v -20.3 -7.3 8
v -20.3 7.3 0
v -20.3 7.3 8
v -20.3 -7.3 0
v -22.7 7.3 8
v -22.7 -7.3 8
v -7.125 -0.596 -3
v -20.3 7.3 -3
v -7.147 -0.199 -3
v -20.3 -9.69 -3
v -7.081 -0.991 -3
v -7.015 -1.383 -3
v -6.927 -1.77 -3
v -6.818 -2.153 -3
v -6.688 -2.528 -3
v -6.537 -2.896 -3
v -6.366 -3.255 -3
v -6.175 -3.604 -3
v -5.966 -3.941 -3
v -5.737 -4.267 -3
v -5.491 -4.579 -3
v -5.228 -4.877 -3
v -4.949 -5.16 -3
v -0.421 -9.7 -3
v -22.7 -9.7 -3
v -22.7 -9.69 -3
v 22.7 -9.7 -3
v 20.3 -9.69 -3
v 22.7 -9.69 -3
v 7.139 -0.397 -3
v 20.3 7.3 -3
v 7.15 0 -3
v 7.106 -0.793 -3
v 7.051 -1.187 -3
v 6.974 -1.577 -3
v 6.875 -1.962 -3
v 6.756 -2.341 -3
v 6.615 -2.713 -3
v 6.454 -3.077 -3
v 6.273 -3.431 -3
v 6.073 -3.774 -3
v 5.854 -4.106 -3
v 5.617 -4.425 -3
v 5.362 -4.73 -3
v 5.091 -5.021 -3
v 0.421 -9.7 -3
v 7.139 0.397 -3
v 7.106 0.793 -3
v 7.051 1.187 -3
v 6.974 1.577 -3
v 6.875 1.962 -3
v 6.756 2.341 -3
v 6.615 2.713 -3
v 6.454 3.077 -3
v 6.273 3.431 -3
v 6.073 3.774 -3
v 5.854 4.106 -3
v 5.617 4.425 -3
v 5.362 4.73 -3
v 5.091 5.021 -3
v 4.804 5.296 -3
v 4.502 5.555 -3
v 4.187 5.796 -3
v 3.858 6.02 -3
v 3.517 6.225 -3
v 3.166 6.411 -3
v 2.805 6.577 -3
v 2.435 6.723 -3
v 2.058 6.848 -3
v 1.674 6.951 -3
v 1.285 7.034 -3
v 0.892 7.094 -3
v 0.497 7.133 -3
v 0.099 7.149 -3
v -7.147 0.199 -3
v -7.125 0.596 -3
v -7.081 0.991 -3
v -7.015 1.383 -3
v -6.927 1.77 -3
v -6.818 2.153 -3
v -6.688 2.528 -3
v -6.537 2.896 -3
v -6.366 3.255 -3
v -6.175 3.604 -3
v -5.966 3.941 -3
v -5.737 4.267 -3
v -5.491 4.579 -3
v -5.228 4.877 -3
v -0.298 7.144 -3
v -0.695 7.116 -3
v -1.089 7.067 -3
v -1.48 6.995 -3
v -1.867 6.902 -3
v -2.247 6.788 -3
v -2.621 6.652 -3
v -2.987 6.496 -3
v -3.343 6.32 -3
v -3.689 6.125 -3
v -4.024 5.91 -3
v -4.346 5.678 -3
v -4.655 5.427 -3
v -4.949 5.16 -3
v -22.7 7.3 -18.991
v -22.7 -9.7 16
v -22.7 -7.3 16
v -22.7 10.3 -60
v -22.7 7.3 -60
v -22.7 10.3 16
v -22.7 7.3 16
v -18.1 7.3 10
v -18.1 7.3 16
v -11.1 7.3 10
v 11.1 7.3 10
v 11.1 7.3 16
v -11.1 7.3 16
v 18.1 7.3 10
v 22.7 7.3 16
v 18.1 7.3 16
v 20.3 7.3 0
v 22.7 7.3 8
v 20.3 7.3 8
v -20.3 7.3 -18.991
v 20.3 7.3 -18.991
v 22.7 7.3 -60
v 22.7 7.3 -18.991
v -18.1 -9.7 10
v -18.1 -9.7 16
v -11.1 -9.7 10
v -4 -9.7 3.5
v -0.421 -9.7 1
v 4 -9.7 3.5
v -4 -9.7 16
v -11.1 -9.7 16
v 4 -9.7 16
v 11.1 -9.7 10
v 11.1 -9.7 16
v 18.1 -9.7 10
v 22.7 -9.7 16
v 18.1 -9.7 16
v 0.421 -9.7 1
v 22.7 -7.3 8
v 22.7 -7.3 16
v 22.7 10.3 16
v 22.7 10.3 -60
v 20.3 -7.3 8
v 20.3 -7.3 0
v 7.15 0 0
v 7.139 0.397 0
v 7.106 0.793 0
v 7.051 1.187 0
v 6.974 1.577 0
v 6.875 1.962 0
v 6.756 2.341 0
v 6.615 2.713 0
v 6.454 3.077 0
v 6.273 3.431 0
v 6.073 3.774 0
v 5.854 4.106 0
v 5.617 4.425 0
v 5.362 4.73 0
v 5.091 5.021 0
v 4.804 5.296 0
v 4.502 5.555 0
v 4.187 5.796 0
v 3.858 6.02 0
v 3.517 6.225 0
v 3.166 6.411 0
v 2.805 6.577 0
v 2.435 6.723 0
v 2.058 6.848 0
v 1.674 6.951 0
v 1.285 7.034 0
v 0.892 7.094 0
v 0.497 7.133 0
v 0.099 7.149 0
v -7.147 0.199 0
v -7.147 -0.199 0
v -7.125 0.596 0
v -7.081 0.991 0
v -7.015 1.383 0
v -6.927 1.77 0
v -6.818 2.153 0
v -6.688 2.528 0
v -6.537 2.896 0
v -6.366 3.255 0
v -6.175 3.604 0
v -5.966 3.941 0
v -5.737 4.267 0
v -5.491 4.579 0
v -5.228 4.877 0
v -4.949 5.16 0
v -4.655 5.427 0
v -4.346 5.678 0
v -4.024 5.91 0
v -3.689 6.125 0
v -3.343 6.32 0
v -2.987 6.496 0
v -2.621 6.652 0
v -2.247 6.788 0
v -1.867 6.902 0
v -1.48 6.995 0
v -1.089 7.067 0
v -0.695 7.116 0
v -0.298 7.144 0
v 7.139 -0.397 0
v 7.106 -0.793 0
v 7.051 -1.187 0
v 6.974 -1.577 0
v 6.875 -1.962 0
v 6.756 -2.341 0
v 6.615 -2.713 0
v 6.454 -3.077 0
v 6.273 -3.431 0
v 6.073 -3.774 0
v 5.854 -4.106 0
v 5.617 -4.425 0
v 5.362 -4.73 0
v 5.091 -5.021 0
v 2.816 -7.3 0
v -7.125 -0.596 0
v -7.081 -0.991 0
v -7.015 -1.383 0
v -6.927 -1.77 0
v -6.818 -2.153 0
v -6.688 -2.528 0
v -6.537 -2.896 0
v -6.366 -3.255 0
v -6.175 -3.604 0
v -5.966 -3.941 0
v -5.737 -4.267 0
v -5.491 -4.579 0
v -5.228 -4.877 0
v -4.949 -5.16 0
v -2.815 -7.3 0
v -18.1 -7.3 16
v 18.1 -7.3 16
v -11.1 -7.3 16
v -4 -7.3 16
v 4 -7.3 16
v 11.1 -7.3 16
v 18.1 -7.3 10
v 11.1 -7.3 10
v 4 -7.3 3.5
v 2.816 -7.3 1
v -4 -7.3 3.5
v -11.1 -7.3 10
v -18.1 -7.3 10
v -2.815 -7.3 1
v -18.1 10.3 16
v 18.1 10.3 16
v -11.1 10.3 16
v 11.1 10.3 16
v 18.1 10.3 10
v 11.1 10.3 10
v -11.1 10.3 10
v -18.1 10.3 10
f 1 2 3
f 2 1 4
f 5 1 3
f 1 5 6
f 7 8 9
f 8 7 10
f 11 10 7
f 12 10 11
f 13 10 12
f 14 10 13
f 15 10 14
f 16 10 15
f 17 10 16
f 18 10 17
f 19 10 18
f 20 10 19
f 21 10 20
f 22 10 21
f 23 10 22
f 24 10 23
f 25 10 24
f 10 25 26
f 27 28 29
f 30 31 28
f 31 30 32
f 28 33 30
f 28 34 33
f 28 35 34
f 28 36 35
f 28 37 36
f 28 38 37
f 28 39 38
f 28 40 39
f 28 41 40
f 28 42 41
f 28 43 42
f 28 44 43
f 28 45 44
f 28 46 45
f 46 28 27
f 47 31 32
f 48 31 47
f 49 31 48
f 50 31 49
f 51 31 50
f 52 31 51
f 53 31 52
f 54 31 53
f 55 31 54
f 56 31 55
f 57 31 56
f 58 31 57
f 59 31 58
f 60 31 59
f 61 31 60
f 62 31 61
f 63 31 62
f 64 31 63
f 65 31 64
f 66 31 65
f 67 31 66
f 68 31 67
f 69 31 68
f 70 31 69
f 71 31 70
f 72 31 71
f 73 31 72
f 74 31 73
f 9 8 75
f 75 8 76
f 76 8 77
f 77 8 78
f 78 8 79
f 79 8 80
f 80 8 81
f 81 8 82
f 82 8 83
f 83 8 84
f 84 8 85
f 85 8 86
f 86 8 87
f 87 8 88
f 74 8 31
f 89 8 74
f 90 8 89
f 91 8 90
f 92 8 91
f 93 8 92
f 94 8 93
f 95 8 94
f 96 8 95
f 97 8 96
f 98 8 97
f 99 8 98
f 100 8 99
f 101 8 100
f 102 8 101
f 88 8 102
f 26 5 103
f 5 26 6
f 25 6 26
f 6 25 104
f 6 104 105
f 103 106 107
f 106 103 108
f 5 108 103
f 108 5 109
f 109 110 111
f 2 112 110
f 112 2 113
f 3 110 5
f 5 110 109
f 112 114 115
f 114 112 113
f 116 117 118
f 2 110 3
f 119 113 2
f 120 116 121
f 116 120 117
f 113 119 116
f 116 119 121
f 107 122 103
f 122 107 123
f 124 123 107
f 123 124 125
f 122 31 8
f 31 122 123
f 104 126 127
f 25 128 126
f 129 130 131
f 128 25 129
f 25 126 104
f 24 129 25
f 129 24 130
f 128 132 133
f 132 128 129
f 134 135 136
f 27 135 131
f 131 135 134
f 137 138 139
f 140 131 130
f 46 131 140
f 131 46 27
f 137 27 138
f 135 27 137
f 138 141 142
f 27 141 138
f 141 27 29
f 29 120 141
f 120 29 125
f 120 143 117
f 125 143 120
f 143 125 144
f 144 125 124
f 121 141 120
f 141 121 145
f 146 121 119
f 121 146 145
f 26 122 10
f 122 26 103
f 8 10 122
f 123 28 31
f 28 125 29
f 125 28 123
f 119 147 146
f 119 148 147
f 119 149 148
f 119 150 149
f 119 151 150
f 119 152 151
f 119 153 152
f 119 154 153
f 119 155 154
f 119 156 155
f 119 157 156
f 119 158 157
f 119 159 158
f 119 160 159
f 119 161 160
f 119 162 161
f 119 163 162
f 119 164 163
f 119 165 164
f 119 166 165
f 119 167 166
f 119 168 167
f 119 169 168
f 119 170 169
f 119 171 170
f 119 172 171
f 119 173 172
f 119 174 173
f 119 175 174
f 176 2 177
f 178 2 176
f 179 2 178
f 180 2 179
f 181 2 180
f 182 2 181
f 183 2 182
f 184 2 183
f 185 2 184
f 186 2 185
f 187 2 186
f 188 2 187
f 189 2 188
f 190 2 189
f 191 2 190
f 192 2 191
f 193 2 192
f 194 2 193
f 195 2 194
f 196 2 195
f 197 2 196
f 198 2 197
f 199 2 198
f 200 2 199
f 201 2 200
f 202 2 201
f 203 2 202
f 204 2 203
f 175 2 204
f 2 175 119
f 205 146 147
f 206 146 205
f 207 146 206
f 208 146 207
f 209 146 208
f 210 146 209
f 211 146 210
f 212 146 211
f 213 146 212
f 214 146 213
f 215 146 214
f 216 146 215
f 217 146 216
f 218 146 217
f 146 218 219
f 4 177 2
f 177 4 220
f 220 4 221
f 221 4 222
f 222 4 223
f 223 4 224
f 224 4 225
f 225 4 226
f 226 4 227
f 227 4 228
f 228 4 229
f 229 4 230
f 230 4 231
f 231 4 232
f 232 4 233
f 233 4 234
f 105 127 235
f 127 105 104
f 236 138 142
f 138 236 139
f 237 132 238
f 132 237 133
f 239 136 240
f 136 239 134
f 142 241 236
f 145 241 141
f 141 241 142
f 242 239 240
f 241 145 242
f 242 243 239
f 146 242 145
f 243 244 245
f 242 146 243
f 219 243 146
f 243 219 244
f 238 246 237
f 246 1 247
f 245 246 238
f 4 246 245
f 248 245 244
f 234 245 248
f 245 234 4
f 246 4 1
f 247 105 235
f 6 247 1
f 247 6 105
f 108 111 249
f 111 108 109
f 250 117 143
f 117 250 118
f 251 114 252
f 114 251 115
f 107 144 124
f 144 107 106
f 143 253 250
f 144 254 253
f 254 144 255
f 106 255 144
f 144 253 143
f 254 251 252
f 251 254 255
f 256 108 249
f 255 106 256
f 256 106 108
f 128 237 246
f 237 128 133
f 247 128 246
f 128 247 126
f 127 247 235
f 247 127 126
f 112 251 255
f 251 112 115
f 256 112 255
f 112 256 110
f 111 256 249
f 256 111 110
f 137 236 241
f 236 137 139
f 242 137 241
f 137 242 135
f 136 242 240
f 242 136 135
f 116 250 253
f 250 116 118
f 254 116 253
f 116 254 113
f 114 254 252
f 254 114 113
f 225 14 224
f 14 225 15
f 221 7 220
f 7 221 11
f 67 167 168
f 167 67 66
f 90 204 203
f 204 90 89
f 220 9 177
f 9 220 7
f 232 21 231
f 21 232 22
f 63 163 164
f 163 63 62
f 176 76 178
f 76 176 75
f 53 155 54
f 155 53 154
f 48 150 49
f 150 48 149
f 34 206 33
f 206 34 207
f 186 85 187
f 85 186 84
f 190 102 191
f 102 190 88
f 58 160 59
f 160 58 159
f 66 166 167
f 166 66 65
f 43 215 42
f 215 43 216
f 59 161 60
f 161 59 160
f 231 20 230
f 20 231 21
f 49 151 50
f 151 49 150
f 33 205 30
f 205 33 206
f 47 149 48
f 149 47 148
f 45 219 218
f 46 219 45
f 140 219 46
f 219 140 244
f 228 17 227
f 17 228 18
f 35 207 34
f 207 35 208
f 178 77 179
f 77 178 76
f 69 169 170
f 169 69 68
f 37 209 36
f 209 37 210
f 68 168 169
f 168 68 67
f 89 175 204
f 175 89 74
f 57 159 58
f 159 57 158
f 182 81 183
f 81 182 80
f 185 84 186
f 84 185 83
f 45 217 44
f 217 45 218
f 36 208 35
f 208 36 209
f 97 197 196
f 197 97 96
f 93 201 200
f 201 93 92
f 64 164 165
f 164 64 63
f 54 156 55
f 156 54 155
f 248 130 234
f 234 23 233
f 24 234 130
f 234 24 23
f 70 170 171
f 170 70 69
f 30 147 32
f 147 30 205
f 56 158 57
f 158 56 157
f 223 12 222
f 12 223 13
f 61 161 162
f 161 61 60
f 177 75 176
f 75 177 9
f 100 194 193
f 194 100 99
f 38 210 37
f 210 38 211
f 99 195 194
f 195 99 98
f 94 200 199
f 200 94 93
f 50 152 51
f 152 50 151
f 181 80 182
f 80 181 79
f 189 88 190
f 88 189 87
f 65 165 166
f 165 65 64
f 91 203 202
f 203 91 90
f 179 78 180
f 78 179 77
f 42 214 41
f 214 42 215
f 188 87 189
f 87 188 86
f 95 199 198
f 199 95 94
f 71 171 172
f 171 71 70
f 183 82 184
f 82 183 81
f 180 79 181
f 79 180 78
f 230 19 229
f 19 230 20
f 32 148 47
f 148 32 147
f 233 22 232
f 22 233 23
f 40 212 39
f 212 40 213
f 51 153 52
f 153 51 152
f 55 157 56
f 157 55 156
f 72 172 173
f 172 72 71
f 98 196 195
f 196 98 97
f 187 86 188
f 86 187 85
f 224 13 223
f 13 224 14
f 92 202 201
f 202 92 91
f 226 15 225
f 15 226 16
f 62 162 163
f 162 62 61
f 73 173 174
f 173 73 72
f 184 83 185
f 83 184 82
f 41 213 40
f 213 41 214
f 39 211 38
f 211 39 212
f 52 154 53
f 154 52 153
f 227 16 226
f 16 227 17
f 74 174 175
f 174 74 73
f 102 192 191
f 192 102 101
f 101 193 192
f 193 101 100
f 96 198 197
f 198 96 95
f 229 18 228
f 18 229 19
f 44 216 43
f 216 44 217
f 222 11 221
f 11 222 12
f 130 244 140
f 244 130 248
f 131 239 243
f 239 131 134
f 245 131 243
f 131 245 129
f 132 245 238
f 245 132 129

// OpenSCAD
/* =====================================================
   Dipole antenna wall sleeve
   =====================================================
   An open-top pocket for the black hinge block of a
   telescoping dipole (two chrome rods, coax out the front,
   stepped round stub underneath). The block drops in
   rods-up, the stub passes through a hole in the floor, and
   a tall back plate takes a Command strip on the wall.

   Block (measured):
     body          40 wide x 14 deep x 18 tall: 11 mm straight,
                   then angled corners down to a flat bottom
     raised piece  18 x 12 x 1 on top, between the rods
     stubs         Ø13.5 then Ø10.5, 20 mm together below the
                   block (38 total); the split between them
                   is a guess from the photos
     screws        Torx heads front, nuts back, 1 mm proud.
                   They are also the rod hinges. Positions are
                   from the photos: ~14.6 mm either side of
                   centre, ~4.5 mm below the top
     cable         Ø3.5, out the front face roughly centred,
                   bottom edge 14 mm below the top

   Sleeve:
     - front/back walls stop 2 mm under the block top so it's
       easy to grab, with open-top slots for the screw heads
       (they also key it side to side)
     - front wall has an open-top slot for the cable
     - side walls are low so the rods can still fold out flat
     - the back plate runs down behind the stub, long enough
       for a medium Command strip (19 x 70) standing upright

   Print it lying on the back plate (wall side down). Nothing
   overhangs except the floor hole, which is a teardrop.

   Coordinates: X across (centred), Y toward the wall
   (block centred on Y = 0), Z up from the floor top (block
   bottom).
   ===================================================== */

$fa = 2;
$fs = 0.4;

/* ── Block (measured) ───────────────────────────────── */
blk_w      = 40;
blk_d      = 14;
blk_h      = 18;
blk_rect_h = 11;    // straight part before the angled corners
blk_bot_w  = 22;    // flat bottom width (estimated; not load-bearing)
stub1_d    = 13.5;
stub1_h    = 8;     // estimated
stub2_d    = 10.5;
stub2_h    = 12;    // estimated
screw_x    = 14.6;  // either side of centre (from photos)
screw_z    = 4.5;   // below the block top (from photos)
screw_head = 6;     // head / nut size, generous
screw_out  = 1;
cable_d    = 3.5;
cable_bot  = 14;    // cable bottom edge below the block top
cable_x    = 0;     // looks centred in the photos

/* ── Sleeve ─────────────────────────────────────────── */
clear       = 0.3;  // per side around the block
wall        = 2.4;
floor_t     = 3;
wall_drop   = 2;    // front/back walls end this far under the block top
side_drop   = 10;   // side walls end this far under the block top
screw_slot  = screw_head + 1;
cable_slot  = 8;    // wide, since the cable position is from photos
stub_clear  = 0.4;  // per side through the floor
plate_t     = 3;    // back wall / Command strip plate
plate_h     = 76;   // overall, top of walls down
gusset_t    = 2.4;
gusset_h    = 16;

/* ── Derived ────────────────────────────────────────── */
pw    = blk_w + 2 * clear;           // pocket
pd    = blk_d + 2 * clear;
ow    = pw + 2 * wall;               // outside width
wall_h = blk_h - wall_drop;          // above the floor top
side_h = blk_h - side_drop;
y_front = -pd / 2 - wall;
y_back  =  pd / 2;                   // plate front face
eps   = 0.01;

module teardrop_hole(d, h) {
    // axis Z; the point faces -Y, which is up when printed on the plate
    linear_extrude(h) hull() {
        circle(d = d);
        translate([0, -d / 2 / sin(45) ]) square(0.01, center = true);
    }
}

module sleeve() {
    difference() {
        union() {
            // floor
            translate([-ow / 2, y_front, -floor_t])
                cube([ow, y_back - y_front, floor_t]);
            // front wall
            translate([-ow / 2, y_front, -floor_t])
                cube([ow, wall, floor_t + wall_h]);
            // side walls
            for (s = [-1, 1])
                translate([s > 0 ? pw / 2 : -ow / 2, y_front, -floor_t])
                    cube([wall, y_back - y_front, floor_t + side_h]);
            // back plate: back wall above the floor, strip plate below
            translate([-ow / 2, y_back, wall_h - plate_h])
                cube([ow, plate_t, plate_h]);
            // gussets under the floor, at the side walls
            for (s = [-1, 1])
                translate([s * (ow / 2 - gusset_t / 2) - gusset_t / 2, y_back + eps, -floor_t])
                    rotate([0, 90, 0]) linear_extrude(gusset_t)
                        polygon([[0, 0], [0, y_front - y_back], [gusset_h, 0]]);
        }
        // stub hole
        translate([0, 0, -floor_t - 1])
            teardrop_hole(stub1_d + 2 * stub_clear, floor_t + 2);
        // screw-head slots, front and back walls
        for (s = [-1, 1], y = [y_front - 1, y_back - 1])
            translate([s * screw_x - screw_slot / 2, y, blk_h - screw_z - screw_slot / 2])
                cube([screw_slot, wall + 2, blk_h]);
        // cable slot, front wall
        translate([cable_x - cable_slot / 2, y_front - 1, blk_h - cable_bot - 0.5])
            cube([cable_slot, wall + 2, blk_h]);
    }
}

// the antenna block, for checking the fit in preview only
module block_mock() {
    color("black") {
        hull() {
            translate([-blk_w / 2, -blk_d / 2, blk_h - blk_rect_h])
                cube([blk_w, blk_d, blk_rect_h]);
            translate([-blk_bot_w / 2, -blk_d / 2, 0])
                cube([blk_bot_w, blk_d, eps]);
        }
        translate([-9, -6, blk_h]) cube([18, 12, 1]);
        translate([0, 0, -stub1_h]) cylinder(d = stub1_d, h = stub1_h);
        translate([0, 0, -stub1_h - stub2_h]) cylinder(d = stub2_d, h = stub2_h);
        for (s = [-1, 1])
            translate([s * screw_x, 0, blk_h - screw_z])
                rotate([90, 0, 0]) cylinder(d = 5, h = blk_d + 2 * screw_out, center = true);
        translate([cable_x, -blk_d / 2, blk_h - cable_bot + cable_d / 2])
            rotate([90, 0, 0]) cylinder(d = cable_d, h = 20);
    }
}

sleeve();
%block_mock();
